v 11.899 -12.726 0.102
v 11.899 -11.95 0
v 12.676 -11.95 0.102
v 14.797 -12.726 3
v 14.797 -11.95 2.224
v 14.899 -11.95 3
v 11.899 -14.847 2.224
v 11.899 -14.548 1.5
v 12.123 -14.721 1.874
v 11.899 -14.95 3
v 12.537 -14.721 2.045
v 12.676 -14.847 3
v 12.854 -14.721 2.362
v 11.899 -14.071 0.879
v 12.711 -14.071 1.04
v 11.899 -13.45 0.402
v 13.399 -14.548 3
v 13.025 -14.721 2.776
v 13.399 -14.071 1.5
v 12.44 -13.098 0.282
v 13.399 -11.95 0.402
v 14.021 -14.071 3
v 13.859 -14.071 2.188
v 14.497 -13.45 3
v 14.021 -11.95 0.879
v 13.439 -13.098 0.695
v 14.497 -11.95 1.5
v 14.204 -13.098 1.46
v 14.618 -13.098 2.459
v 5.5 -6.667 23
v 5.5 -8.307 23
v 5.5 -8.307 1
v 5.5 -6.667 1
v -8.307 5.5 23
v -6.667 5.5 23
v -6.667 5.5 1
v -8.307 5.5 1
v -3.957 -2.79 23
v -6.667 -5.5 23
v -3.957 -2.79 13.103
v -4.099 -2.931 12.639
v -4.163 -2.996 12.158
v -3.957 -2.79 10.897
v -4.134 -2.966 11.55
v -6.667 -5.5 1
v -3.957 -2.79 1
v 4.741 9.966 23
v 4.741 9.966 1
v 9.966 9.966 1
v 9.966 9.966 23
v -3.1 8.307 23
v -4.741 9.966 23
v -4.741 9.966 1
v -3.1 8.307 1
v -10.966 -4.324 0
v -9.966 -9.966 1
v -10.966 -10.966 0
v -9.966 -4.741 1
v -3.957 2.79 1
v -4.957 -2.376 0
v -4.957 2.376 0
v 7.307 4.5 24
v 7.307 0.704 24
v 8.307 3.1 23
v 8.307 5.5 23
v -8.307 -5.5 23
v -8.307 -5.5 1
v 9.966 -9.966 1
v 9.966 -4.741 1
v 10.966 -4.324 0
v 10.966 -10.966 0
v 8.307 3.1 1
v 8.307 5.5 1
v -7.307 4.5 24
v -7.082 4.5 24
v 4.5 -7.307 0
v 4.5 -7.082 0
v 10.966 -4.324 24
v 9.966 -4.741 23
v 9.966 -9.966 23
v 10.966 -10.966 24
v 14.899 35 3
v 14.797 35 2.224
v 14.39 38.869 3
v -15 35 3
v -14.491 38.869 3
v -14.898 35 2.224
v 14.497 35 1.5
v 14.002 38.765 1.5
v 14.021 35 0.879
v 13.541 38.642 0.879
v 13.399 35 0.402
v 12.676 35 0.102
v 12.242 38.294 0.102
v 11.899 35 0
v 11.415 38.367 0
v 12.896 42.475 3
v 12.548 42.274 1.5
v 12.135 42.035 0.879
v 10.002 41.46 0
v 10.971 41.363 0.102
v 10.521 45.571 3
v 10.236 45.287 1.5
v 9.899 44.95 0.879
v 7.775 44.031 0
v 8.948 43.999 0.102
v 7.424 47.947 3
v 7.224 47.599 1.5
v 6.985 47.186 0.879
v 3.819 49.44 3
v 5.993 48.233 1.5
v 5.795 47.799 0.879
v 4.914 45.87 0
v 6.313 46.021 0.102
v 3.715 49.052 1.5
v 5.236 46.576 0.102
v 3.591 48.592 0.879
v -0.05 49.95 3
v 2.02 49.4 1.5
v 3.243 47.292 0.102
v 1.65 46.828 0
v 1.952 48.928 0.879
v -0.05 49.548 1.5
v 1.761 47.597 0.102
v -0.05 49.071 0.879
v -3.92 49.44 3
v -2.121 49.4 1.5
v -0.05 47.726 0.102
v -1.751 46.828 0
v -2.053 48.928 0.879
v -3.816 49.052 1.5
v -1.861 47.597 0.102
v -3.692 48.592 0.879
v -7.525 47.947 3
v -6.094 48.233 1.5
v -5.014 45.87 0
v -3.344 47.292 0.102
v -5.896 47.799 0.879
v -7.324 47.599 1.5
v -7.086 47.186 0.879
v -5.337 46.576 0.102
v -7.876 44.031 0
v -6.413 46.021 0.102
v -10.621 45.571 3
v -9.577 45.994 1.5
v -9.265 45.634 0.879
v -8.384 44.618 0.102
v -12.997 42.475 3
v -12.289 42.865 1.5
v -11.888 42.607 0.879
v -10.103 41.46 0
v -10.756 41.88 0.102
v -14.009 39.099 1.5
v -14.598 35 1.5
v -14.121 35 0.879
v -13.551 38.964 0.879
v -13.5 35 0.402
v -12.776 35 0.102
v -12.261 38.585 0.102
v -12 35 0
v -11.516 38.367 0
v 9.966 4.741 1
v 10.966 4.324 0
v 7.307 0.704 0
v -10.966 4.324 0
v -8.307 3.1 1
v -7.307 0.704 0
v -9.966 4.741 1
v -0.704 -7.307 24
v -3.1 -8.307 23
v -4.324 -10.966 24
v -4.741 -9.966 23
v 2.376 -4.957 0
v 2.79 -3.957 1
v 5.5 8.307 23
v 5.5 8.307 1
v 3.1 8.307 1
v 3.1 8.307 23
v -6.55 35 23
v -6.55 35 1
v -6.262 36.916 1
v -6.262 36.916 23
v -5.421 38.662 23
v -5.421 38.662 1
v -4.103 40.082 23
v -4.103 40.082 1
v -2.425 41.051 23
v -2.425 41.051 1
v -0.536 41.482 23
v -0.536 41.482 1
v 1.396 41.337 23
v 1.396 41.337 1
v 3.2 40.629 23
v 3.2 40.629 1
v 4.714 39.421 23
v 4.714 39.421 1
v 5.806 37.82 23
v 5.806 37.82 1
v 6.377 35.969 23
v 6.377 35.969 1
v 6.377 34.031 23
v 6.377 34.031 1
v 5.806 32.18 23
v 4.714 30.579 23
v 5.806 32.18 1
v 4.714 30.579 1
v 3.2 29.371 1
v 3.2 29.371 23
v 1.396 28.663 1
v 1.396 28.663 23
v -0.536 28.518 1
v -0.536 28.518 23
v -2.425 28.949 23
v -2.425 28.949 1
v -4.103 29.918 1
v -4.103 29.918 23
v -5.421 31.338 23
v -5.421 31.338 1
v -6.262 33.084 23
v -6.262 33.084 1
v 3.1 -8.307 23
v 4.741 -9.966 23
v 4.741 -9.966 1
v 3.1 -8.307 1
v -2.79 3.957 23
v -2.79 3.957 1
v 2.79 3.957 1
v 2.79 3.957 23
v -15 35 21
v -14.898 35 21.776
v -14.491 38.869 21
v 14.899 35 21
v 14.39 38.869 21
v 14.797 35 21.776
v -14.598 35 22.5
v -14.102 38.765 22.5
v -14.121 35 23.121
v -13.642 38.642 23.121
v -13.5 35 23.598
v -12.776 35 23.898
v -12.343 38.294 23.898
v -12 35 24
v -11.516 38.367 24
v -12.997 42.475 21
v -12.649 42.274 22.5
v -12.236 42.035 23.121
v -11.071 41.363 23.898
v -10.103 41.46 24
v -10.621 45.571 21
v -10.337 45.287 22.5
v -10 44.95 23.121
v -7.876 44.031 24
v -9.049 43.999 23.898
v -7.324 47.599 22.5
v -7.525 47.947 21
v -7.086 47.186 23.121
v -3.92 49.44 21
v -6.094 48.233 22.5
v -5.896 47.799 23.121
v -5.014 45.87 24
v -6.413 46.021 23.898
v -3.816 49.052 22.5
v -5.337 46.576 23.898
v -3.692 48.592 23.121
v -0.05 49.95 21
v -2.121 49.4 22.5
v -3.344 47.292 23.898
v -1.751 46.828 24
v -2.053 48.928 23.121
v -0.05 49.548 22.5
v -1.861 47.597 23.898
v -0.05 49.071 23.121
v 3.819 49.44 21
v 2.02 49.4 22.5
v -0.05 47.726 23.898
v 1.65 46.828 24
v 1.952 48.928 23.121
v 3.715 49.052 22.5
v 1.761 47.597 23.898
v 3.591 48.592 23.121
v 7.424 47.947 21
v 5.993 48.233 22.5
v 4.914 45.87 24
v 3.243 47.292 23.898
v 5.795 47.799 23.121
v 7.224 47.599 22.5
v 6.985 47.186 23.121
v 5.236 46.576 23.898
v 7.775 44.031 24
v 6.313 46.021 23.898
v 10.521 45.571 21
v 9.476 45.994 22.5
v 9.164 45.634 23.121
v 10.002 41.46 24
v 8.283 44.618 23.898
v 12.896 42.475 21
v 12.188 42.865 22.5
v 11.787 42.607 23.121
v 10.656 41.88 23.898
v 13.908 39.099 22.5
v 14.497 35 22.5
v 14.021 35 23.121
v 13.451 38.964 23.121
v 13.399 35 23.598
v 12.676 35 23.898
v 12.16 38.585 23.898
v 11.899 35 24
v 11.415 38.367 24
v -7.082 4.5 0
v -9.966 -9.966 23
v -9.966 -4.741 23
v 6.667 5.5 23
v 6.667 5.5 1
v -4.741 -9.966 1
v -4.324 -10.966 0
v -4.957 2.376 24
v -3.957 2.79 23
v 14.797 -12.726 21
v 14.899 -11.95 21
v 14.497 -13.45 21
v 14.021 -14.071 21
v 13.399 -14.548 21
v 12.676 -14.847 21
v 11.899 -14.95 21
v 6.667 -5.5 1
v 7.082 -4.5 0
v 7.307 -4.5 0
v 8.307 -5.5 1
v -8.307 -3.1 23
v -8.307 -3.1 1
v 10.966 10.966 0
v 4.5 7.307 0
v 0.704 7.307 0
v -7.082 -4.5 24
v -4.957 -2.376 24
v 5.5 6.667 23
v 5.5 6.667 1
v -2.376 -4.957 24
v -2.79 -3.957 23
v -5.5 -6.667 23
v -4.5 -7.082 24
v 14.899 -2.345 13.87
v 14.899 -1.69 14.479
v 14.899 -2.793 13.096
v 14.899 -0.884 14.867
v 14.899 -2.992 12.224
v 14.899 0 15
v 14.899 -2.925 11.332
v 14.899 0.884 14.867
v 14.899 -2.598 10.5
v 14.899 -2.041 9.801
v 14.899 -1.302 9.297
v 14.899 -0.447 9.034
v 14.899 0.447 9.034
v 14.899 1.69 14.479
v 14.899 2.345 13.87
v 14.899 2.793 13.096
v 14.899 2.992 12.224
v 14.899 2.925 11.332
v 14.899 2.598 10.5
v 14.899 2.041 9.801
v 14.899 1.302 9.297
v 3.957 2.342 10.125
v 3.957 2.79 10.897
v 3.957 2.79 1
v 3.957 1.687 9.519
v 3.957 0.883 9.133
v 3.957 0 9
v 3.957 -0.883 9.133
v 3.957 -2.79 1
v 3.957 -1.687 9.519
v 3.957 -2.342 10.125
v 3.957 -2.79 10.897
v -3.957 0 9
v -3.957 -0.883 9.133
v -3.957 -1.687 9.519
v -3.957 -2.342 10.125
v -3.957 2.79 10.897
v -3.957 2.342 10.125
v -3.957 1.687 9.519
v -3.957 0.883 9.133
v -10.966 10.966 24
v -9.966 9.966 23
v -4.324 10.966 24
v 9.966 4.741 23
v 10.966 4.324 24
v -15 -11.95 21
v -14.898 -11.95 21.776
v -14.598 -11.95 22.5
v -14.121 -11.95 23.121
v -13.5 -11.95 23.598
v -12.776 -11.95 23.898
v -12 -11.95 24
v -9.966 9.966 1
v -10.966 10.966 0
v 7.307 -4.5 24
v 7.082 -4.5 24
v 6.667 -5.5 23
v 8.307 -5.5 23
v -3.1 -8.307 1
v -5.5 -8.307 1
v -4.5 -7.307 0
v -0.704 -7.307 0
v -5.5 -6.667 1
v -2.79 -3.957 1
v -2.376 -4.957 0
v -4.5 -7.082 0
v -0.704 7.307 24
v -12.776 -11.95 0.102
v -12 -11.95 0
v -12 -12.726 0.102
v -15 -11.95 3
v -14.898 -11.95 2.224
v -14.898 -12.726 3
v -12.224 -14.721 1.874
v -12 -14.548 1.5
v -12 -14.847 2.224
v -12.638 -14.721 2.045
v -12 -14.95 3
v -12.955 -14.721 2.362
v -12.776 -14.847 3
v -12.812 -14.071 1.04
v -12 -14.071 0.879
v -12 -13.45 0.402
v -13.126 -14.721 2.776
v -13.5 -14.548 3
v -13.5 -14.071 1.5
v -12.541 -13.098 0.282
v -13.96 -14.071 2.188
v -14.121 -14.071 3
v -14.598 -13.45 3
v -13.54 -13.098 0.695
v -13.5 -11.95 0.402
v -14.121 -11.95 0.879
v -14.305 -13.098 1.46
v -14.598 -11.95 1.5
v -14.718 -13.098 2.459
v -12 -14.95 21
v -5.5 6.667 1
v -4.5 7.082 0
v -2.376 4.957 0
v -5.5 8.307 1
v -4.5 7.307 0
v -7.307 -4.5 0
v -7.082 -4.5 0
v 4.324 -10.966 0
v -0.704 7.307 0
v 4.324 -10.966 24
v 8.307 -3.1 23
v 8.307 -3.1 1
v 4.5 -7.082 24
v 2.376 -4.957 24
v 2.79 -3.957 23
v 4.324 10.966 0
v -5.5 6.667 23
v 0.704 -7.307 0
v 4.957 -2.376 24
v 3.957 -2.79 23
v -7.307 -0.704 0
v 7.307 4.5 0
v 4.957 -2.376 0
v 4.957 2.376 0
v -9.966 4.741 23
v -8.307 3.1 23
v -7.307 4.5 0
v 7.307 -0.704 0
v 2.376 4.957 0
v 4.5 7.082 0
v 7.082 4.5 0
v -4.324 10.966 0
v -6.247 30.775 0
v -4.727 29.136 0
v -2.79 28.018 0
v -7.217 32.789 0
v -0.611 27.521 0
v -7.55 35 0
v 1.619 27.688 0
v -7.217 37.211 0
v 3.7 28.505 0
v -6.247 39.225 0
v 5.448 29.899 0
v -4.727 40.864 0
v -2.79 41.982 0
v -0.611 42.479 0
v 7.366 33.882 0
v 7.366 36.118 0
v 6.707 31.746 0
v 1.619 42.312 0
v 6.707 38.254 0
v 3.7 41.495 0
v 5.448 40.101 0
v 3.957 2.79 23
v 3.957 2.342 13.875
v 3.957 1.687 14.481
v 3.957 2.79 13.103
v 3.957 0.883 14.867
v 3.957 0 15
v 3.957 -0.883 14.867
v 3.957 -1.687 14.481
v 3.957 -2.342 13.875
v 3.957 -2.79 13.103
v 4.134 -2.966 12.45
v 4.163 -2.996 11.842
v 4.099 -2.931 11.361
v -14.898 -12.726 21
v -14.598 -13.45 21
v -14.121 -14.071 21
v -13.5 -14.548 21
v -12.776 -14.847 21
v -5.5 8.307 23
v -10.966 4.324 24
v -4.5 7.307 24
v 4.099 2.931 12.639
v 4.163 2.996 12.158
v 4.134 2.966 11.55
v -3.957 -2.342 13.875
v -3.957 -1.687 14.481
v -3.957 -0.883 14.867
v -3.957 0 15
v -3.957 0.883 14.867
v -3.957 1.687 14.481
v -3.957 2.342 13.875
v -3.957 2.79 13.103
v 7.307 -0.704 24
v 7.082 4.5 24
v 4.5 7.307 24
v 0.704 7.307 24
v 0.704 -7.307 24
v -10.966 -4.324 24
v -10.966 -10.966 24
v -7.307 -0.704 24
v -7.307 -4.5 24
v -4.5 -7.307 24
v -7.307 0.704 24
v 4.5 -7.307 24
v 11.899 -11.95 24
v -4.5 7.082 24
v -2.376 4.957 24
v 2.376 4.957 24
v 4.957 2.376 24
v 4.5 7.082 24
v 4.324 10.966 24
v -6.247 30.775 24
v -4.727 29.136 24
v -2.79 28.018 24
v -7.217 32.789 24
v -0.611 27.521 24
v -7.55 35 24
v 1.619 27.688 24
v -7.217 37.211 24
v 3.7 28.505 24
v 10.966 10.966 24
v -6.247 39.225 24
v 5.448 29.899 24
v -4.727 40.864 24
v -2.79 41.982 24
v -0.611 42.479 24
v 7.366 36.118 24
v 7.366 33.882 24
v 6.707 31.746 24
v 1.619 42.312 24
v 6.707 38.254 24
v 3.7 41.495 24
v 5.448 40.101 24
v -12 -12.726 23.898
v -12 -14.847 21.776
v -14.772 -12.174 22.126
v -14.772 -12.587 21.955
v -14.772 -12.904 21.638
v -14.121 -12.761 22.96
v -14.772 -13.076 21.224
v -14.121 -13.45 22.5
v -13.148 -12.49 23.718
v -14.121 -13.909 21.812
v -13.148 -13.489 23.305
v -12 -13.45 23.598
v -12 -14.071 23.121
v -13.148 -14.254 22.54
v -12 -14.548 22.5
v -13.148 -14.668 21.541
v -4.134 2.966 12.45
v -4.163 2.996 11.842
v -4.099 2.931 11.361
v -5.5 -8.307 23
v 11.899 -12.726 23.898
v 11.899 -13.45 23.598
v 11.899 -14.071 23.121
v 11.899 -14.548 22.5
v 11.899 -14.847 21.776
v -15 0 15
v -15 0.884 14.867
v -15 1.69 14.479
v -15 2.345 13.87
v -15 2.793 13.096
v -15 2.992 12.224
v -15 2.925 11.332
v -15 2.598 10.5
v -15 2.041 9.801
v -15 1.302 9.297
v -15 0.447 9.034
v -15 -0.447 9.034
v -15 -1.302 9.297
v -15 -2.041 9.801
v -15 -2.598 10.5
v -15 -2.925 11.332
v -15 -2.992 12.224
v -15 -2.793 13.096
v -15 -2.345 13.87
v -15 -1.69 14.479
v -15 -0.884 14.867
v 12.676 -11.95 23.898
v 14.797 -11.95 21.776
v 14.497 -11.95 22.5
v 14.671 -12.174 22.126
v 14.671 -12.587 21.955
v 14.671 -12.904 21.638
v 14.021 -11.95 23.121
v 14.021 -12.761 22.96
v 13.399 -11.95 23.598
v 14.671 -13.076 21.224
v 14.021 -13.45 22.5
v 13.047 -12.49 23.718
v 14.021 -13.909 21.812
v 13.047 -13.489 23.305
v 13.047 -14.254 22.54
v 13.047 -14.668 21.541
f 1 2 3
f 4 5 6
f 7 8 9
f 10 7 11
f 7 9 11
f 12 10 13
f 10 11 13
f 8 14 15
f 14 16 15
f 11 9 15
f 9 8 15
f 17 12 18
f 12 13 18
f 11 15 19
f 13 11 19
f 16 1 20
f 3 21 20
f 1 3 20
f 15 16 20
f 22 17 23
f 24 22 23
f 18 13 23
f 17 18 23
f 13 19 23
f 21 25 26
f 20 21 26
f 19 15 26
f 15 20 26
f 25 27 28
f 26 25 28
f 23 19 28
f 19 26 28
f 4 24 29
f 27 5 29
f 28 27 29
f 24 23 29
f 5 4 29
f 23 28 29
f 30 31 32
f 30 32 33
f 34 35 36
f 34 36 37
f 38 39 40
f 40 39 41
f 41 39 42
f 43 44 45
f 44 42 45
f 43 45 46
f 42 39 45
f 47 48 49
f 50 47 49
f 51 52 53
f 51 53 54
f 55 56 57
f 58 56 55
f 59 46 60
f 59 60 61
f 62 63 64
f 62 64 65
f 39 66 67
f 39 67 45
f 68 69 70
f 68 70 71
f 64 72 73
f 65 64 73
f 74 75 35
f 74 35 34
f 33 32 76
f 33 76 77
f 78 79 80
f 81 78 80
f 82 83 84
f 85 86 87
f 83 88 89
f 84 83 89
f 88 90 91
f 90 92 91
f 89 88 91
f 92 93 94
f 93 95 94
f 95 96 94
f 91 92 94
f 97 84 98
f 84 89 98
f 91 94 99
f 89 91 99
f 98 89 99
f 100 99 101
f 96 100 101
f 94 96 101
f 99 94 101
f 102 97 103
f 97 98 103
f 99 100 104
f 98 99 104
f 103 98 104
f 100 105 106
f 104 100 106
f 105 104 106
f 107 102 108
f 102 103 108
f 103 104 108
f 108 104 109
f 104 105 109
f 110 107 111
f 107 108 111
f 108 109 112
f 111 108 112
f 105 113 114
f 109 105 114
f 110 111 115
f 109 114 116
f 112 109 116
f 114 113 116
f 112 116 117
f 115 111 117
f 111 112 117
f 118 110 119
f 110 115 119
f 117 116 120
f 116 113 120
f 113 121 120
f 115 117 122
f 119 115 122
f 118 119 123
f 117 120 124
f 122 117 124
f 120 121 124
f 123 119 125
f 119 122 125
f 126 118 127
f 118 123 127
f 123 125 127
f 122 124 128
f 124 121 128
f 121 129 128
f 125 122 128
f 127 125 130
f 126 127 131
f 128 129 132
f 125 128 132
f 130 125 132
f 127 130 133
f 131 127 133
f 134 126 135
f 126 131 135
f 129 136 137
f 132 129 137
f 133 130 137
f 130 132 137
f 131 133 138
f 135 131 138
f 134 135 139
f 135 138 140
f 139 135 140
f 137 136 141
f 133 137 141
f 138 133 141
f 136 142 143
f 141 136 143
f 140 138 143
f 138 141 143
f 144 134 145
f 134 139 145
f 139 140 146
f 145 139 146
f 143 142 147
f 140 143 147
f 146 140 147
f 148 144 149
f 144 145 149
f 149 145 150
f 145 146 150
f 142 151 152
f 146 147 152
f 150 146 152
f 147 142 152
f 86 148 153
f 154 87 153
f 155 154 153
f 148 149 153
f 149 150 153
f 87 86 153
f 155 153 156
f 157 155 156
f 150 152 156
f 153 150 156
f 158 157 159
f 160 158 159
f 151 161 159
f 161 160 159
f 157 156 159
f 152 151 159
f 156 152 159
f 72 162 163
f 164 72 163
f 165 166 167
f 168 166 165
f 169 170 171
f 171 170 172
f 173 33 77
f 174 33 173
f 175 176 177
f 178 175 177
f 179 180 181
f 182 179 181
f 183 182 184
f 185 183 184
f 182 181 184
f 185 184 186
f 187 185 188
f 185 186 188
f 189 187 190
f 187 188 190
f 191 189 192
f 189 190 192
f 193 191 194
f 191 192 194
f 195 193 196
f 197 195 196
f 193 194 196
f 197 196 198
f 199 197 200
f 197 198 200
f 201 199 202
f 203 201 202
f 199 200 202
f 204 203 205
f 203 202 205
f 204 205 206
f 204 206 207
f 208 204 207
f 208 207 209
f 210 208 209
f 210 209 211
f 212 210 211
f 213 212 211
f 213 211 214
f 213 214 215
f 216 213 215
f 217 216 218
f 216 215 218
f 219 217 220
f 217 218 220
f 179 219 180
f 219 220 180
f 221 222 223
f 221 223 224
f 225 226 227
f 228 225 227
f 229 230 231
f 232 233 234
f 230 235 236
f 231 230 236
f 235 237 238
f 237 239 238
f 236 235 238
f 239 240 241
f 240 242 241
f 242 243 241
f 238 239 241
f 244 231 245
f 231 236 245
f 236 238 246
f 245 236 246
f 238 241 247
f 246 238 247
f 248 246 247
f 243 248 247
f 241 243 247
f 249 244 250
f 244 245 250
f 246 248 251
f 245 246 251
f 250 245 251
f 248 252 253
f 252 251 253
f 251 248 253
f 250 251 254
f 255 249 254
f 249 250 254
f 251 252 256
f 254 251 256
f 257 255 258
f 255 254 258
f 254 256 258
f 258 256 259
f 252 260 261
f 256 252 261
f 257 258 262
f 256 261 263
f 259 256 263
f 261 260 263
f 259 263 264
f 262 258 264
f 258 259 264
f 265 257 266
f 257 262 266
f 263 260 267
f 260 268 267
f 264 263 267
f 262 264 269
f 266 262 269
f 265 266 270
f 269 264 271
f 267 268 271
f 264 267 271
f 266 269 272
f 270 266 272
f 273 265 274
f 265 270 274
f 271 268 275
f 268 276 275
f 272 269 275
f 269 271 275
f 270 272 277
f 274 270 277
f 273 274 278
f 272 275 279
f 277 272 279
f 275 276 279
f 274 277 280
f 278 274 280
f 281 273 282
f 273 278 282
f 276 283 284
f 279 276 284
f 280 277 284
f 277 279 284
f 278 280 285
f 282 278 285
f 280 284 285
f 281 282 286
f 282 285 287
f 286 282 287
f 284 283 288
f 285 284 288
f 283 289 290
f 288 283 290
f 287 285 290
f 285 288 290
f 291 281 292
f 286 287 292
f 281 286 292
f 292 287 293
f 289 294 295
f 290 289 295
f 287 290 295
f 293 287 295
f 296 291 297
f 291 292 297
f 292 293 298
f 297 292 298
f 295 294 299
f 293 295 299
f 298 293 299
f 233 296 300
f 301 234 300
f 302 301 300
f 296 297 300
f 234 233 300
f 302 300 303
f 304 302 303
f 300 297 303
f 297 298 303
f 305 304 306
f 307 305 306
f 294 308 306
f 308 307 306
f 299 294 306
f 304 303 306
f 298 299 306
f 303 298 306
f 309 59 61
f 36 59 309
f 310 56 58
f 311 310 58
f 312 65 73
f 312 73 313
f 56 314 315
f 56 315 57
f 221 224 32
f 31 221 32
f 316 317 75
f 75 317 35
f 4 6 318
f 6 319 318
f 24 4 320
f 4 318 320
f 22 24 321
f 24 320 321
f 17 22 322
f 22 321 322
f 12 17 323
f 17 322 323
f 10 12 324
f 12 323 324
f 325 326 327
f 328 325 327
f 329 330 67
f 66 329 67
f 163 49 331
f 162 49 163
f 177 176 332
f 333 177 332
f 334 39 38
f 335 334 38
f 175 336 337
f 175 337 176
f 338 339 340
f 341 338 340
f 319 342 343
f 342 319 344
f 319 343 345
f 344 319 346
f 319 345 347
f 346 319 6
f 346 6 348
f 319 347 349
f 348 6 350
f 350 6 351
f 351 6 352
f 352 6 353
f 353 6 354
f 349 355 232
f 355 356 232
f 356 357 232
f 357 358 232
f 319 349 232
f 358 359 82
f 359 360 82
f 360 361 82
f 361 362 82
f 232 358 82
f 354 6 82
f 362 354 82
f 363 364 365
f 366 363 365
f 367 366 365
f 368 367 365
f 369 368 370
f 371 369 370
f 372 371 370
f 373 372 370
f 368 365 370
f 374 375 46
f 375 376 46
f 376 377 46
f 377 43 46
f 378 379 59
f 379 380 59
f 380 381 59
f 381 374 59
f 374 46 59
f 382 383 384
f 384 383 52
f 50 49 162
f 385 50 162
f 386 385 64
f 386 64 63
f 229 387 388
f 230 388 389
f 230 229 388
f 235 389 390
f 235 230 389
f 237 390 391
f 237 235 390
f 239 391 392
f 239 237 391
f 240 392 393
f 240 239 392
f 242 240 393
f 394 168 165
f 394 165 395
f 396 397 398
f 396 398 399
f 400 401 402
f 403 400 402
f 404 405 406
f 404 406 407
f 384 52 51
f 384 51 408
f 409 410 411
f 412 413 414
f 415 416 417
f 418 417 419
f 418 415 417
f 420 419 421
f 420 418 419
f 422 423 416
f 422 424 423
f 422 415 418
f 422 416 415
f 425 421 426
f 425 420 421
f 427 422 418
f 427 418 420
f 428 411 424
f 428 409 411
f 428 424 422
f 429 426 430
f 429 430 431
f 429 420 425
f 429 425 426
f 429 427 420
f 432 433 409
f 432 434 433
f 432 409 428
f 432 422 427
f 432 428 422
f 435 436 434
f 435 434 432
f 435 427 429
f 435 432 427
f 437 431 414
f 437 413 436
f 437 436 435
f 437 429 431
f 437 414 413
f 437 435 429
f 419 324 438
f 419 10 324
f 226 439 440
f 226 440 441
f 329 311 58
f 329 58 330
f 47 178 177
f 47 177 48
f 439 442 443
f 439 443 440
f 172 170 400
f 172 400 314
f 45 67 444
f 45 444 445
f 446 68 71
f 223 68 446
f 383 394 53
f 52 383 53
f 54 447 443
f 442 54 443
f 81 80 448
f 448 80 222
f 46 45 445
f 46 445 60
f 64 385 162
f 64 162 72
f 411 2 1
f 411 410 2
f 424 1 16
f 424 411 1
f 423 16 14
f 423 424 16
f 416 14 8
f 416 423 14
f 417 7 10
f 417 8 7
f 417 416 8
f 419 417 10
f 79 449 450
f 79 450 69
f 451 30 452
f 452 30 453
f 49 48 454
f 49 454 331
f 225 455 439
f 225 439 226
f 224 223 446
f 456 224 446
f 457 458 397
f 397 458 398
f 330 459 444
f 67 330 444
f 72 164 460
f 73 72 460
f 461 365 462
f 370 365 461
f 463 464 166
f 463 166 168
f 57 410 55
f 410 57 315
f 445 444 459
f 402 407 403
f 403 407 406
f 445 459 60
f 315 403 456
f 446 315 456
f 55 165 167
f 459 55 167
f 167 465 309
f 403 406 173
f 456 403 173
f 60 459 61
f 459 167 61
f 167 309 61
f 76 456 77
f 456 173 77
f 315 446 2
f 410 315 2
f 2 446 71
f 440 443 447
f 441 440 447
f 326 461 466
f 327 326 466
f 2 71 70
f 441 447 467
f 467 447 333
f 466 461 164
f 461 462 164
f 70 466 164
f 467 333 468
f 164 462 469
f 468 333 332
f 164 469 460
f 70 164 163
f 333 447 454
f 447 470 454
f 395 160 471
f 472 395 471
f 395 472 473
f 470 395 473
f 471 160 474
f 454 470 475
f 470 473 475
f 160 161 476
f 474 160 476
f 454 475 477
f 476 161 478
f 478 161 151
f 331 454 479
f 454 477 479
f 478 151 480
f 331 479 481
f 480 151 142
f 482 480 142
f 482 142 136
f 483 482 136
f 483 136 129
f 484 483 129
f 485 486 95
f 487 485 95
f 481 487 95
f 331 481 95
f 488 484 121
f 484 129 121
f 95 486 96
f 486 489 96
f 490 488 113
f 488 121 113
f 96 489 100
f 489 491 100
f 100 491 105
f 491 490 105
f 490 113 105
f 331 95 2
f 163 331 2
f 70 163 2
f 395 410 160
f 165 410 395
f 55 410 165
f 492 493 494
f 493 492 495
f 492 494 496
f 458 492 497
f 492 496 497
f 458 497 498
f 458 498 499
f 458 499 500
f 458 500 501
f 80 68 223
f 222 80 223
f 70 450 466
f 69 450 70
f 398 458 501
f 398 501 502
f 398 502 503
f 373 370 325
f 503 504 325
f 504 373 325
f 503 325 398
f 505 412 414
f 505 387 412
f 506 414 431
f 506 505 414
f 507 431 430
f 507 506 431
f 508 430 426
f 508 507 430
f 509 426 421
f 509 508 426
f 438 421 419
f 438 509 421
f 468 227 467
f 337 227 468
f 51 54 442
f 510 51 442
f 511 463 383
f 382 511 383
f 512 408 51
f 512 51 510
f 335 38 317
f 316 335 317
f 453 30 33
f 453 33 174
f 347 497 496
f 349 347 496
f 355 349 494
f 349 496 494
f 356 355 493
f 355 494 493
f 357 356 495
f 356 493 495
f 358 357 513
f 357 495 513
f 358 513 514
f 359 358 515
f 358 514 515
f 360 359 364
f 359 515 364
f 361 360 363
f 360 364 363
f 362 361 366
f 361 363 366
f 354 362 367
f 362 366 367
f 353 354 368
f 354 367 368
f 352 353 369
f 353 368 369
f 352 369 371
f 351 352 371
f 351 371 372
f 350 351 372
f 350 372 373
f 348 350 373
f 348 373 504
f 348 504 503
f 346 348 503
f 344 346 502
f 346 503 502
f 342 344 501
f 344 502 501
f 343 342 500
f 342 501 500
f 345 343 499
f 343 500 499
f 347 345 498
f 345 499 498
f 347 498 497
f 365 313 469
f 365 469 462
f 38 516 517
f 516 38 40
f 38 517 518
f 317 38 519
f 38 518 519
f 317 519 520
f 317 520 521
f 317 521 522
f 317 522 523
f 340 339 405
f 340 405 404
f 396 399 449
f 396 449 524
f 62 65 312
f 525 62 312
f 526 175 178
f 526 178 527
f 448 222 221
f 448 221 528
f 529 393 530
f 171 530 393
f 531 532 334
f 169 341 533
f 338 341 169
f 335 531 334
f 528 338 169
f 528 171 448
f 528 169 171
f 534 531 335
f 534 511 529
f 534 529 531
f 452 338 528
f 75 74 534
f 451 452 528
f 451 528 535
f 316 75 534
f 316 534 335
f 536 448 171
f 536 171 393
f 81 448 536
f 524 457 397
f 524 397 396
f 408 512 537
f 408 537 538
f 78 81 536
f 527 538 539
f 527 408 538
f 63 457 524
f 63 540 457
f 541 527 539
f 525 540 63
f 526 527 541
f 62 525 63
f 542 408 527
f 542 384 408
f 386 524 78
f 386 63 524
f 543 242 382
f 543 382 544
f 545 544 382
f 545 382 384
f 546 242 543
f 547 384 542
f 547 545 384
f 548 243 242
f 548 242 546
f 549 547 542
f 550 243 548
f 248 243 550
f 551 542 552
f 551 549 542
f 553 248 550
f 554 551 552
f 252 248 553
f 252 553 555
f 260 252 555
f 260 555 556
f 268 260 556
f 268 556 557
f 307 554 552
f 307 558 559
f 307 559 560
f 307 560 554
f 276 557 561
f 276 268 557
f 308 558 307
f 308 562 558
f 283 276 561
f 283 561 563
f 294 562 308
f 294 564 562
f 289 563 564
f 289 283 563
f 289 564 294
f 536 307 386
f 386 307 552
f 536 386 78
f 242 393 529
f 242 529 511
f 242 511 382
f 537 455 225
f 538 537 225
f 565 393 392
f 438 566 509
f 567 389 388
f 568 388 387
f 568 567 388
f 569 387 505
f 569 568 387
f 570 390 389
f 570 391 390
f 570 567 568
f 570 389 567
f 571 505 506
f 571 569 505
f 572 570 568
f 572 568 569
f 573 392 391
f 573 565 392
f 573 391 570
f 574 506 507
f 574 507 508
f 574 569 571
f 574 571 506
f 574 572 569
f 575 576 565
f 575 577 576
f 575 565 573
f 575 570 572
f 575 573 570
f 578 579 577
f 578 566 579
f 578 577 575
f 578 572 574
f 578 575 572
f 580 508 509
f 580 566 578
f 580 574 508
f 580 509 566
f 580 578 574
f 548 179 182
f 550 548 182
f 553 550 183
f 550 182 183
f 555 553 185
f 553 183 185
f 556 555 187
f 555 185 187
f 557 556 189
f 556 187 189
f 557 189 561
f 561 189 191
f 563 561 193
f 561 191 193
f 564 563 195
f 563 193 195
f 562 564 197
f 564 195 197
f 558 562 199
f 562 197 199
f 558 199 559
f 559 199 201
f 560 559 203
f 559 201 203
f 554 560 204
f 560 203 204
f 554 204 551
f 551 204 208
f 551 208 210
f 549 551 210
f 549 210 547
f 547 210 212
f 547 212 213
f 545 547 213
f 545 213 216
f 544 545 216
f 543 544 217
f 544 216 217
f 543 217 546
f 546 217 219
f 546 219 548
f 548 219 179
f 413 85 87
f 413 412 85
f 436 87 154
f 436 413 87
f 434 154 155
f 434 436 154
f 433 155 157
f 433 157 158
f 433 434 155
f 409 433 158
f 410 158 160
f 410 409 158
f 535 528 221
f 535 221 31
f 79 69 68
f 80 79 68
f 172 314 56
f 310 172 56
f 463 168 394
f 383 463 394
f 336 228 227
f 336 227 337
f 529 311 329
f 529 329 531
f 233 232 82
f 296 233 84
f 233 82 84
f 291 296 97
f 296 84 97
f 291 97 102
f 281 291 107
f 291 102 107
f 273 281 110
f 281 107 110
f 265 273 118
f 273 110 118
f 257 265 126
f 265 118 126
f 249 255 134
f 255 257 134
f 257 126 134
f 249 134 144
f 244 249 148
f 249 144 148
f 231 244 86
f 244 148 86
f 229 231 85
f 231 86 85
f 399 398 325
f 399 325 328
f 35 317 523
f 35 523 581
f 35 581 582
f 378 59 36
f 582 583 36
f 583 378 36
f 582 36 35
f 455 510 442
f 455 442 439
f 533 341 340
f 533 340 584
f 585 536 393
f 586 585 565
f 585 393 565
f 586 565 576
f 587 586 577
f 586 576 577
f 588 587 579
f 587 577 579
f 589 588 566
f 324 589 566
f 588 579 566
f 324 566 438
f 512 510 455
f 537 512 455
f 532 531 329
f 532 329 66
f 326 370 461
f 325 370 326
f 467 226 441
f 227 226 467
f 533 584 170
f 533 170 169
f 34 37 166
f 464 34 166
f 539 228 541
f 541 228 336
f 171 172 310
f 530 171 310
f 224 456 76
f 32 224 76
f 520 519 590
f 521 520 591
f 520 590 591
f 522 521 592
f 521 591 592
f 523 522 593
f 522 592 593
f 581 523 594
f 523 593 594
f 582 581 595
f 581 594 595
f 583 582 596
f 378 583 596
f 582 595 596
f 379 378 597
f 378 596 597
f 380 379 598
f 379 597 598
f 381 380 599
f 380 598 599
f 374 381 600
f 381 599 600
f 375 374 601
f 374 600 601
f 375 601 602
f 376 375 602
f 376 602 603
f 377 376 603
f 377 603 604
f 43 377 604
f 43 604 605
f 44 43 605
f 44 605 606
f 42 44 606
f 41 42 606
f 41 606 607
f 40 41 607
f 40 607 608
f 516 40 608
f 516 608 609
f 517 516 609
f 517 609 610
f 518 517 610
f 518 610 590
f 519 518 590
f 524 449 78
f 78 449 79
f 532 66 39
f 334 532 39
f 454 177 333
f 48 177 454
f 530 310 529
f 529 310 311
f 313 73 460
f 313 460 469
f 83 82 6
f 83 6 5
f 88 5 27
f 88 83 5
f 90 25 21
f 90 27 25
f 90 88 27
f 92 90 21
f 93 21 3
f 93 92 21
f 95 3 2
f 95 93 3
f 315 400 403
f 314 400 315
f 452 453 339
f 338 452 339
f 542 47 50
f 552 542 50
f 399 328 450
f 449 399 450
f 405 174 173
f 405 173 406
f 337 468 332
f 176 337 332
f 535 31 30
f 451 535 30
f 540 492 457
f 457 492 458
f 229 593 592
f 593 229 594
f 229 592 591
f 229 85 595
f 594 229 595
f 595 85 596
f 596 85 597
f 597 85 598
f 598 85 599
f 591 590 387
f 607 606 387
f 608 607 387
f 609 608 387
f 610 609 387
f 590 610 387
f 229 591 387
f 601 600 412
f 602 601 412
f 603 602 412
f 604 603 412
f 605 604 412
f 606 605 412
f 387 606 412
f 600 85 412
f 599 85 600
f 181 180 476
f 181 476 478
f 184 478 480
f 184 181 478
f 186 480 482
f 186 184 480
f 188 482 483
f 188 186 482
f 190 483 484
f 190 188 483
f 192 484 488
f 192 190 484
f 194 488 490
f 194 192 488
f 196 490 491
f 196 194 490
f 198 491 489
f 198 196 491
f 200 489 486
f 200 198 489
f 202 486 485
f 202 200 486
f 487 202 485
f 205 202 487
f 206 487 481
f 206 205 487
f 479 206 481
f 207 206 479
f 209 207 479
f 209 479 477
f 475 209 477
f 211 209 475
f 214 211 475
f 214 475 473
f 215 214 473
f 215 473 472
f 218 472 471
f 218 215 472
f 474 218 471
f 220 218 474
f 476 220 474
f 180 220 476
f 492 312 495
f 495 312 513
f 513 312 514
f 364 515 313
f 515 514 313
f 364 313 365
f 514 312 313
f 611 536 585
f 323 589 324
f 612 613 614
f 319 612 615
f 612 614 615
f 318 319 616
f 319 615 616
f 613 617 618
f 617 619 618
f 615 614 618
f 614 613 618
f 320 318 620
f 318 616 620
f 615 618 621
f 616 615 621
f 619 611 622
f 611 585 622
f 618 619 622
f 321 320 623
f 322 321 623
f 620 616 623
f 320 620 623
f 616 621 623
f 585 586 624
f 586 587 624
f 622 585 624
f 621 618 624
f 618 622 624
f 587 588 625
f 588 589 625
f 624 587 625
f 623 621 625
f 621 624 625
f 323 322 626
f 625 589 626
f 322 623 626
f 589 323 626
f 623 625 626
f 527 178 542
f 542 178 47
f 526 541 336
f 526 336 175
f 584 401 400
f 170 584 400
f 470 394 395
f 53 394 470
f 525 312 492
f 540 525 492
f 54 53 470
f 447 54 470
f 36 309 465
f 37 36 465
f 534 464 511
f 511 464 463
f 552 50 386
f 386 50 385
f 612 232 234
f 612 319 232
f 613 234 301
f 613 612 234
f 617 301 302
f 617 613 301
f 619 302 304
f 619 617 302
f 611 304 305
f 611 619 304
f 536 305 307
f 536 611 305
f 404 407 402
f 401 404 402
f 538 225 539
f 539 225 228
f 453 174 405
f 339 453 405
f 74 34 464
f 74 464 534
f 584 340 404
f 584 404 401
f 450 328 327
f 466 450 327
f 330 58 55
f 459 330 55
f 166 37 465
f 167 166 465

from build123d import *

# Parameters (mm, degrees)
BOSS_EXTRUDE1_DEPTH = 24
SKETCH4_R           = 6.5
BOSS_EXTRUDE2_DEPTH = 24
SKETCH3_R           = 3
CUT_EXTRUDE1_DEPTH  = 30.899298428
FILLET1_R           = 3
CHAMFER1_SIZE       = 1


with BuildPart() as part:
    # Sketch1 → Boss-Extrude1 (new body)
    with BuildSketch(Plane.XY):
        Polygon((0, 15), (14.899298428, 15), (14.899298428, -14.949649214), (-15, -14.949649214), (-15, 15), align=None)
        Polygon((-9.966432809, 9.966432809), (-4.741432809, 9.966432809), (-3.1, 8.307461143), (-5.5, 8.307461143), (-5.5, 6.667461143), (-2.79, 3.957461143), (2.79, 3.957461143), (5.5, 6.667461143), (5.5, 8.307461143), (3.1, 8.307461143), (4.741432809, 9.966432809), (9.966432809, 9.966432809), (9.966432809, 4.741432809), (8.307461143, 3.1), (8.307461143, 5.5), (6.667461143, 5.5), (3.957461143, 2.79), (3.957461143, -2.79), (6.667461143, -5.5), (8.307461143, -5.5), (8.307461143, -3.1), (9.966432809, -4.741432809), (9.966432809, -9.966432809), (4.741432809, -9.966432809), (3.1, -8.307461143), (5.5, -8.307461143), (5.5, -6.667461143), (2.79, -3.957461143), (-2.79, -3.957461143), (-5.5, -6.667461143), (-5.5, -8.307461143), (-3.1, -8.307461143), (-4.741432809, -9.966432809), (-9.966432809, -9.966432809), (-9.966432809, -4.741432809), (-8.307461143, -3.1), (-8.307461143, -5.5), (-6.667461143, -5.5), (-3.957461143, -2.79), (-3.957461143, 2.79), (-6.667461143, 5.5), (-8.307461143, 5.5), (-8.307461143, 3.1), (-9.966432809, 4.741432809), align=None, mode=Mode.SUBTRACT)
    extrude(amount=BOSS_EXTRUDE1_DEPTH)

    # Sketch4 → Boss-Extrude2 (add)
    with BuildSketch(Plane(origin=(0, 0, 0), x_dir=(-1, 0, 0), z_dir=(0, 0, -1))):
        with BuildLine():
            ThreePointArc((-14.899298428, 35), (0.050350786, 49.949649214), (15, 35))
            Line((15, 35), (15, 15))
            Line((15, 15), (-14.899298428, 15))
            Line((-14.899298428, 15), (-14.899298428, 35))
        make_face()
        with Locations((0.050350786, 35)):
            Circle(SKETCH4_R, mode=Mode.SUBTRACT)
    extrude(amount=-BOSS_EXTRUDE2_DEPTH)

    # Sketch3 → Cut-Extrude1 (cut, through all)
    with BuildSketch(Plane.ZY.offset(15)):
        with Locations((12, 0)):
            Circle(SKETCH3_R)
    extrude(amount=-CUT_EXTRUDE1_DEPTH, mode=Mode.SUBTRACT)

    # Fillet1
    fillet1_edges = [part.edges().sort_by_distance(p)[0] for p in [
        (-0.050350786, -14.949649214, 24),
        (14.899298428, 10.025175393, 24),
        (-0.050350786, 49.949649214, 24),
        (-0.050350786, 49.949649214, 0),
        (14.899298428, 10.025175393, 0),
        (-0.050350786, -14.949649214, 0),
        (-15, 10.025175393, 0),
        (-15, 10.025175393, 24),
        (14.899298428, -14.949649214, 12),
        (-15, -14.949649214, 12),
    ]]
    fillet(fillet1_edges, radius=FILLET1_R)

    # Chamfer1
    chamfer1_edges = [part.edges().sort_by_distance(p)[0] for p in [
        (6.449649214, 35, 24),
        (6.449649214, 35, 0),
        (-4.3, 8.307461143, 0),
        (-3.920716405, 9.136946976, 0),
        (-7.353932809, 9.966432809, 0),
        (-9.966432809, 7.353932809, 0),
        (-9.136946976, 3.920716405, 0),
        (-8.307461143, 4.3, 0),
        (-7.487461143, 5.5, 0),
        (-5.312461143, 4.145, 0),
        (-3.957461143, 0, 0),
        (-5.312461143, -4.145, 0),
        (-7.487461143, -5.5, 0),
        (-8.307461143, -4.3, 0),
        (-9.136946976, -3.920716405, 0),
        (-9.966432809, -7.353932809, 0),
        (-7.353932809, -9.966432809, 0),
        (-3.920716405, -9.136946976, 0),
        (-4.3, -8.307461143, 0),
        (-5.5, -7.487461143, 0),
        (-4.145, -5.312461143, 0),
        (0, -3.957461143, 0),
        (4.145, -5.312461143, 0),
        (5.5, -7.487461143, 0),
        (4.3, -8.307461143, 0),
        (3.920716405, -9.136946976, 0),
        (7.353932809, -9.966432809, 0),
        (9.966432809, -7.353932809, 0),
        (9.136946976, -3.920716405, 0),
        (8.307461143, -4.3, 0),
        (7.487461143, -5.5, 0),
        (5.312461143, -4.145, 0),
        (3.957461143, 0, 0),
        (5.312461143, 4.145, 0),
        (7.487461143, 5.5, 0),
        (8.307461143, 4.3, 0),
        (9.136946976, 3.920716405, 0),
        (9.966432809, 7.353932809, 0),
        (7.353932809, 9.966432809, 0),
        (3.920716405, 9.136946976, 0),
        (4.3, 8.307461143, 0),
        (5.5, 7.487461143, 0),
        (4.145, 5.312461143, 0),
        (0, 3.957461143, 0),
        (-4.145, 5.312461143, 0),
        (-5.5, 7.487461143, 0),
        (-4.3, 8.307461143, 24),
        (-3.920716405, 9.136946976, 24),
        (-7.353932809, 9.966432809, 24),
        (-9.966432809, 7.353932809, 24),
        (-9.136946976, 3.920716405, 24),
        (-8.307461143, 4.3, 24),
        (-7.487461143, 5.5, 24),
        (-5.312461143, 4.145, 24),
        (-3.957461143, 0, 24),
        (-5.312461143, -4.145, 24),
        (-7.487461143, -5.5, 24),
        (-8.307461143, -4.3, 24),
        (-9.136946976, -3.920716405, 24),
        (-9.966432809, -7.353932809, 24),
        (-7.353932809, -9.966432809, 24),
        (-3.920716405, -9.136946976, 24),
        (-4.3, -8.307461143, 24),
        (-5.5, -7.487461143, 24),
        (-4.145, -5.312461143, 24),
        (0, -3.957461143, 24),
        (4.145, -5.312461143, 24),
        (5.5, -7.487461143, 24),
        (4.3, -8.307461143, 24),
        (3.920716405, -9.136946976, 24),
        (7.353932809, -9.966432809, 24),
        (9.966432809, -7.353932809, 24),
        (9.136946976, -3.920716405, 24),
        (8.307461143, -4.3, 24),
        (7.487461143, -5.5, 24),
        (5.312461143, -4.145, 24),
        (3.957461143, 0, 24),
        (5.312461143, 4.145, 24),
        (7.487461143, 5.5, 24),
        (8.307461143, 4.3, 24),
        (9.136946976, 3.920716405, 24),
        (9.966432809, 7.353932809, 24),
        (7.353932809, 9.966432809, 24),
        (3.920716405, 9.136946976, 24),
        (4.3, 8.307461143, 24),
        (5.5, 7.487461143, 24),
        (4.145, 5.312461143, 24),
        (0, 3.957461143, 24),
        (-4.145, 5.312461143, 24),
        (-5.5, 7.487461143, 24),
    ]]
    chamfer(chamfer1_edges, length=CHAMFER1_SIZE)


solid = part.part
